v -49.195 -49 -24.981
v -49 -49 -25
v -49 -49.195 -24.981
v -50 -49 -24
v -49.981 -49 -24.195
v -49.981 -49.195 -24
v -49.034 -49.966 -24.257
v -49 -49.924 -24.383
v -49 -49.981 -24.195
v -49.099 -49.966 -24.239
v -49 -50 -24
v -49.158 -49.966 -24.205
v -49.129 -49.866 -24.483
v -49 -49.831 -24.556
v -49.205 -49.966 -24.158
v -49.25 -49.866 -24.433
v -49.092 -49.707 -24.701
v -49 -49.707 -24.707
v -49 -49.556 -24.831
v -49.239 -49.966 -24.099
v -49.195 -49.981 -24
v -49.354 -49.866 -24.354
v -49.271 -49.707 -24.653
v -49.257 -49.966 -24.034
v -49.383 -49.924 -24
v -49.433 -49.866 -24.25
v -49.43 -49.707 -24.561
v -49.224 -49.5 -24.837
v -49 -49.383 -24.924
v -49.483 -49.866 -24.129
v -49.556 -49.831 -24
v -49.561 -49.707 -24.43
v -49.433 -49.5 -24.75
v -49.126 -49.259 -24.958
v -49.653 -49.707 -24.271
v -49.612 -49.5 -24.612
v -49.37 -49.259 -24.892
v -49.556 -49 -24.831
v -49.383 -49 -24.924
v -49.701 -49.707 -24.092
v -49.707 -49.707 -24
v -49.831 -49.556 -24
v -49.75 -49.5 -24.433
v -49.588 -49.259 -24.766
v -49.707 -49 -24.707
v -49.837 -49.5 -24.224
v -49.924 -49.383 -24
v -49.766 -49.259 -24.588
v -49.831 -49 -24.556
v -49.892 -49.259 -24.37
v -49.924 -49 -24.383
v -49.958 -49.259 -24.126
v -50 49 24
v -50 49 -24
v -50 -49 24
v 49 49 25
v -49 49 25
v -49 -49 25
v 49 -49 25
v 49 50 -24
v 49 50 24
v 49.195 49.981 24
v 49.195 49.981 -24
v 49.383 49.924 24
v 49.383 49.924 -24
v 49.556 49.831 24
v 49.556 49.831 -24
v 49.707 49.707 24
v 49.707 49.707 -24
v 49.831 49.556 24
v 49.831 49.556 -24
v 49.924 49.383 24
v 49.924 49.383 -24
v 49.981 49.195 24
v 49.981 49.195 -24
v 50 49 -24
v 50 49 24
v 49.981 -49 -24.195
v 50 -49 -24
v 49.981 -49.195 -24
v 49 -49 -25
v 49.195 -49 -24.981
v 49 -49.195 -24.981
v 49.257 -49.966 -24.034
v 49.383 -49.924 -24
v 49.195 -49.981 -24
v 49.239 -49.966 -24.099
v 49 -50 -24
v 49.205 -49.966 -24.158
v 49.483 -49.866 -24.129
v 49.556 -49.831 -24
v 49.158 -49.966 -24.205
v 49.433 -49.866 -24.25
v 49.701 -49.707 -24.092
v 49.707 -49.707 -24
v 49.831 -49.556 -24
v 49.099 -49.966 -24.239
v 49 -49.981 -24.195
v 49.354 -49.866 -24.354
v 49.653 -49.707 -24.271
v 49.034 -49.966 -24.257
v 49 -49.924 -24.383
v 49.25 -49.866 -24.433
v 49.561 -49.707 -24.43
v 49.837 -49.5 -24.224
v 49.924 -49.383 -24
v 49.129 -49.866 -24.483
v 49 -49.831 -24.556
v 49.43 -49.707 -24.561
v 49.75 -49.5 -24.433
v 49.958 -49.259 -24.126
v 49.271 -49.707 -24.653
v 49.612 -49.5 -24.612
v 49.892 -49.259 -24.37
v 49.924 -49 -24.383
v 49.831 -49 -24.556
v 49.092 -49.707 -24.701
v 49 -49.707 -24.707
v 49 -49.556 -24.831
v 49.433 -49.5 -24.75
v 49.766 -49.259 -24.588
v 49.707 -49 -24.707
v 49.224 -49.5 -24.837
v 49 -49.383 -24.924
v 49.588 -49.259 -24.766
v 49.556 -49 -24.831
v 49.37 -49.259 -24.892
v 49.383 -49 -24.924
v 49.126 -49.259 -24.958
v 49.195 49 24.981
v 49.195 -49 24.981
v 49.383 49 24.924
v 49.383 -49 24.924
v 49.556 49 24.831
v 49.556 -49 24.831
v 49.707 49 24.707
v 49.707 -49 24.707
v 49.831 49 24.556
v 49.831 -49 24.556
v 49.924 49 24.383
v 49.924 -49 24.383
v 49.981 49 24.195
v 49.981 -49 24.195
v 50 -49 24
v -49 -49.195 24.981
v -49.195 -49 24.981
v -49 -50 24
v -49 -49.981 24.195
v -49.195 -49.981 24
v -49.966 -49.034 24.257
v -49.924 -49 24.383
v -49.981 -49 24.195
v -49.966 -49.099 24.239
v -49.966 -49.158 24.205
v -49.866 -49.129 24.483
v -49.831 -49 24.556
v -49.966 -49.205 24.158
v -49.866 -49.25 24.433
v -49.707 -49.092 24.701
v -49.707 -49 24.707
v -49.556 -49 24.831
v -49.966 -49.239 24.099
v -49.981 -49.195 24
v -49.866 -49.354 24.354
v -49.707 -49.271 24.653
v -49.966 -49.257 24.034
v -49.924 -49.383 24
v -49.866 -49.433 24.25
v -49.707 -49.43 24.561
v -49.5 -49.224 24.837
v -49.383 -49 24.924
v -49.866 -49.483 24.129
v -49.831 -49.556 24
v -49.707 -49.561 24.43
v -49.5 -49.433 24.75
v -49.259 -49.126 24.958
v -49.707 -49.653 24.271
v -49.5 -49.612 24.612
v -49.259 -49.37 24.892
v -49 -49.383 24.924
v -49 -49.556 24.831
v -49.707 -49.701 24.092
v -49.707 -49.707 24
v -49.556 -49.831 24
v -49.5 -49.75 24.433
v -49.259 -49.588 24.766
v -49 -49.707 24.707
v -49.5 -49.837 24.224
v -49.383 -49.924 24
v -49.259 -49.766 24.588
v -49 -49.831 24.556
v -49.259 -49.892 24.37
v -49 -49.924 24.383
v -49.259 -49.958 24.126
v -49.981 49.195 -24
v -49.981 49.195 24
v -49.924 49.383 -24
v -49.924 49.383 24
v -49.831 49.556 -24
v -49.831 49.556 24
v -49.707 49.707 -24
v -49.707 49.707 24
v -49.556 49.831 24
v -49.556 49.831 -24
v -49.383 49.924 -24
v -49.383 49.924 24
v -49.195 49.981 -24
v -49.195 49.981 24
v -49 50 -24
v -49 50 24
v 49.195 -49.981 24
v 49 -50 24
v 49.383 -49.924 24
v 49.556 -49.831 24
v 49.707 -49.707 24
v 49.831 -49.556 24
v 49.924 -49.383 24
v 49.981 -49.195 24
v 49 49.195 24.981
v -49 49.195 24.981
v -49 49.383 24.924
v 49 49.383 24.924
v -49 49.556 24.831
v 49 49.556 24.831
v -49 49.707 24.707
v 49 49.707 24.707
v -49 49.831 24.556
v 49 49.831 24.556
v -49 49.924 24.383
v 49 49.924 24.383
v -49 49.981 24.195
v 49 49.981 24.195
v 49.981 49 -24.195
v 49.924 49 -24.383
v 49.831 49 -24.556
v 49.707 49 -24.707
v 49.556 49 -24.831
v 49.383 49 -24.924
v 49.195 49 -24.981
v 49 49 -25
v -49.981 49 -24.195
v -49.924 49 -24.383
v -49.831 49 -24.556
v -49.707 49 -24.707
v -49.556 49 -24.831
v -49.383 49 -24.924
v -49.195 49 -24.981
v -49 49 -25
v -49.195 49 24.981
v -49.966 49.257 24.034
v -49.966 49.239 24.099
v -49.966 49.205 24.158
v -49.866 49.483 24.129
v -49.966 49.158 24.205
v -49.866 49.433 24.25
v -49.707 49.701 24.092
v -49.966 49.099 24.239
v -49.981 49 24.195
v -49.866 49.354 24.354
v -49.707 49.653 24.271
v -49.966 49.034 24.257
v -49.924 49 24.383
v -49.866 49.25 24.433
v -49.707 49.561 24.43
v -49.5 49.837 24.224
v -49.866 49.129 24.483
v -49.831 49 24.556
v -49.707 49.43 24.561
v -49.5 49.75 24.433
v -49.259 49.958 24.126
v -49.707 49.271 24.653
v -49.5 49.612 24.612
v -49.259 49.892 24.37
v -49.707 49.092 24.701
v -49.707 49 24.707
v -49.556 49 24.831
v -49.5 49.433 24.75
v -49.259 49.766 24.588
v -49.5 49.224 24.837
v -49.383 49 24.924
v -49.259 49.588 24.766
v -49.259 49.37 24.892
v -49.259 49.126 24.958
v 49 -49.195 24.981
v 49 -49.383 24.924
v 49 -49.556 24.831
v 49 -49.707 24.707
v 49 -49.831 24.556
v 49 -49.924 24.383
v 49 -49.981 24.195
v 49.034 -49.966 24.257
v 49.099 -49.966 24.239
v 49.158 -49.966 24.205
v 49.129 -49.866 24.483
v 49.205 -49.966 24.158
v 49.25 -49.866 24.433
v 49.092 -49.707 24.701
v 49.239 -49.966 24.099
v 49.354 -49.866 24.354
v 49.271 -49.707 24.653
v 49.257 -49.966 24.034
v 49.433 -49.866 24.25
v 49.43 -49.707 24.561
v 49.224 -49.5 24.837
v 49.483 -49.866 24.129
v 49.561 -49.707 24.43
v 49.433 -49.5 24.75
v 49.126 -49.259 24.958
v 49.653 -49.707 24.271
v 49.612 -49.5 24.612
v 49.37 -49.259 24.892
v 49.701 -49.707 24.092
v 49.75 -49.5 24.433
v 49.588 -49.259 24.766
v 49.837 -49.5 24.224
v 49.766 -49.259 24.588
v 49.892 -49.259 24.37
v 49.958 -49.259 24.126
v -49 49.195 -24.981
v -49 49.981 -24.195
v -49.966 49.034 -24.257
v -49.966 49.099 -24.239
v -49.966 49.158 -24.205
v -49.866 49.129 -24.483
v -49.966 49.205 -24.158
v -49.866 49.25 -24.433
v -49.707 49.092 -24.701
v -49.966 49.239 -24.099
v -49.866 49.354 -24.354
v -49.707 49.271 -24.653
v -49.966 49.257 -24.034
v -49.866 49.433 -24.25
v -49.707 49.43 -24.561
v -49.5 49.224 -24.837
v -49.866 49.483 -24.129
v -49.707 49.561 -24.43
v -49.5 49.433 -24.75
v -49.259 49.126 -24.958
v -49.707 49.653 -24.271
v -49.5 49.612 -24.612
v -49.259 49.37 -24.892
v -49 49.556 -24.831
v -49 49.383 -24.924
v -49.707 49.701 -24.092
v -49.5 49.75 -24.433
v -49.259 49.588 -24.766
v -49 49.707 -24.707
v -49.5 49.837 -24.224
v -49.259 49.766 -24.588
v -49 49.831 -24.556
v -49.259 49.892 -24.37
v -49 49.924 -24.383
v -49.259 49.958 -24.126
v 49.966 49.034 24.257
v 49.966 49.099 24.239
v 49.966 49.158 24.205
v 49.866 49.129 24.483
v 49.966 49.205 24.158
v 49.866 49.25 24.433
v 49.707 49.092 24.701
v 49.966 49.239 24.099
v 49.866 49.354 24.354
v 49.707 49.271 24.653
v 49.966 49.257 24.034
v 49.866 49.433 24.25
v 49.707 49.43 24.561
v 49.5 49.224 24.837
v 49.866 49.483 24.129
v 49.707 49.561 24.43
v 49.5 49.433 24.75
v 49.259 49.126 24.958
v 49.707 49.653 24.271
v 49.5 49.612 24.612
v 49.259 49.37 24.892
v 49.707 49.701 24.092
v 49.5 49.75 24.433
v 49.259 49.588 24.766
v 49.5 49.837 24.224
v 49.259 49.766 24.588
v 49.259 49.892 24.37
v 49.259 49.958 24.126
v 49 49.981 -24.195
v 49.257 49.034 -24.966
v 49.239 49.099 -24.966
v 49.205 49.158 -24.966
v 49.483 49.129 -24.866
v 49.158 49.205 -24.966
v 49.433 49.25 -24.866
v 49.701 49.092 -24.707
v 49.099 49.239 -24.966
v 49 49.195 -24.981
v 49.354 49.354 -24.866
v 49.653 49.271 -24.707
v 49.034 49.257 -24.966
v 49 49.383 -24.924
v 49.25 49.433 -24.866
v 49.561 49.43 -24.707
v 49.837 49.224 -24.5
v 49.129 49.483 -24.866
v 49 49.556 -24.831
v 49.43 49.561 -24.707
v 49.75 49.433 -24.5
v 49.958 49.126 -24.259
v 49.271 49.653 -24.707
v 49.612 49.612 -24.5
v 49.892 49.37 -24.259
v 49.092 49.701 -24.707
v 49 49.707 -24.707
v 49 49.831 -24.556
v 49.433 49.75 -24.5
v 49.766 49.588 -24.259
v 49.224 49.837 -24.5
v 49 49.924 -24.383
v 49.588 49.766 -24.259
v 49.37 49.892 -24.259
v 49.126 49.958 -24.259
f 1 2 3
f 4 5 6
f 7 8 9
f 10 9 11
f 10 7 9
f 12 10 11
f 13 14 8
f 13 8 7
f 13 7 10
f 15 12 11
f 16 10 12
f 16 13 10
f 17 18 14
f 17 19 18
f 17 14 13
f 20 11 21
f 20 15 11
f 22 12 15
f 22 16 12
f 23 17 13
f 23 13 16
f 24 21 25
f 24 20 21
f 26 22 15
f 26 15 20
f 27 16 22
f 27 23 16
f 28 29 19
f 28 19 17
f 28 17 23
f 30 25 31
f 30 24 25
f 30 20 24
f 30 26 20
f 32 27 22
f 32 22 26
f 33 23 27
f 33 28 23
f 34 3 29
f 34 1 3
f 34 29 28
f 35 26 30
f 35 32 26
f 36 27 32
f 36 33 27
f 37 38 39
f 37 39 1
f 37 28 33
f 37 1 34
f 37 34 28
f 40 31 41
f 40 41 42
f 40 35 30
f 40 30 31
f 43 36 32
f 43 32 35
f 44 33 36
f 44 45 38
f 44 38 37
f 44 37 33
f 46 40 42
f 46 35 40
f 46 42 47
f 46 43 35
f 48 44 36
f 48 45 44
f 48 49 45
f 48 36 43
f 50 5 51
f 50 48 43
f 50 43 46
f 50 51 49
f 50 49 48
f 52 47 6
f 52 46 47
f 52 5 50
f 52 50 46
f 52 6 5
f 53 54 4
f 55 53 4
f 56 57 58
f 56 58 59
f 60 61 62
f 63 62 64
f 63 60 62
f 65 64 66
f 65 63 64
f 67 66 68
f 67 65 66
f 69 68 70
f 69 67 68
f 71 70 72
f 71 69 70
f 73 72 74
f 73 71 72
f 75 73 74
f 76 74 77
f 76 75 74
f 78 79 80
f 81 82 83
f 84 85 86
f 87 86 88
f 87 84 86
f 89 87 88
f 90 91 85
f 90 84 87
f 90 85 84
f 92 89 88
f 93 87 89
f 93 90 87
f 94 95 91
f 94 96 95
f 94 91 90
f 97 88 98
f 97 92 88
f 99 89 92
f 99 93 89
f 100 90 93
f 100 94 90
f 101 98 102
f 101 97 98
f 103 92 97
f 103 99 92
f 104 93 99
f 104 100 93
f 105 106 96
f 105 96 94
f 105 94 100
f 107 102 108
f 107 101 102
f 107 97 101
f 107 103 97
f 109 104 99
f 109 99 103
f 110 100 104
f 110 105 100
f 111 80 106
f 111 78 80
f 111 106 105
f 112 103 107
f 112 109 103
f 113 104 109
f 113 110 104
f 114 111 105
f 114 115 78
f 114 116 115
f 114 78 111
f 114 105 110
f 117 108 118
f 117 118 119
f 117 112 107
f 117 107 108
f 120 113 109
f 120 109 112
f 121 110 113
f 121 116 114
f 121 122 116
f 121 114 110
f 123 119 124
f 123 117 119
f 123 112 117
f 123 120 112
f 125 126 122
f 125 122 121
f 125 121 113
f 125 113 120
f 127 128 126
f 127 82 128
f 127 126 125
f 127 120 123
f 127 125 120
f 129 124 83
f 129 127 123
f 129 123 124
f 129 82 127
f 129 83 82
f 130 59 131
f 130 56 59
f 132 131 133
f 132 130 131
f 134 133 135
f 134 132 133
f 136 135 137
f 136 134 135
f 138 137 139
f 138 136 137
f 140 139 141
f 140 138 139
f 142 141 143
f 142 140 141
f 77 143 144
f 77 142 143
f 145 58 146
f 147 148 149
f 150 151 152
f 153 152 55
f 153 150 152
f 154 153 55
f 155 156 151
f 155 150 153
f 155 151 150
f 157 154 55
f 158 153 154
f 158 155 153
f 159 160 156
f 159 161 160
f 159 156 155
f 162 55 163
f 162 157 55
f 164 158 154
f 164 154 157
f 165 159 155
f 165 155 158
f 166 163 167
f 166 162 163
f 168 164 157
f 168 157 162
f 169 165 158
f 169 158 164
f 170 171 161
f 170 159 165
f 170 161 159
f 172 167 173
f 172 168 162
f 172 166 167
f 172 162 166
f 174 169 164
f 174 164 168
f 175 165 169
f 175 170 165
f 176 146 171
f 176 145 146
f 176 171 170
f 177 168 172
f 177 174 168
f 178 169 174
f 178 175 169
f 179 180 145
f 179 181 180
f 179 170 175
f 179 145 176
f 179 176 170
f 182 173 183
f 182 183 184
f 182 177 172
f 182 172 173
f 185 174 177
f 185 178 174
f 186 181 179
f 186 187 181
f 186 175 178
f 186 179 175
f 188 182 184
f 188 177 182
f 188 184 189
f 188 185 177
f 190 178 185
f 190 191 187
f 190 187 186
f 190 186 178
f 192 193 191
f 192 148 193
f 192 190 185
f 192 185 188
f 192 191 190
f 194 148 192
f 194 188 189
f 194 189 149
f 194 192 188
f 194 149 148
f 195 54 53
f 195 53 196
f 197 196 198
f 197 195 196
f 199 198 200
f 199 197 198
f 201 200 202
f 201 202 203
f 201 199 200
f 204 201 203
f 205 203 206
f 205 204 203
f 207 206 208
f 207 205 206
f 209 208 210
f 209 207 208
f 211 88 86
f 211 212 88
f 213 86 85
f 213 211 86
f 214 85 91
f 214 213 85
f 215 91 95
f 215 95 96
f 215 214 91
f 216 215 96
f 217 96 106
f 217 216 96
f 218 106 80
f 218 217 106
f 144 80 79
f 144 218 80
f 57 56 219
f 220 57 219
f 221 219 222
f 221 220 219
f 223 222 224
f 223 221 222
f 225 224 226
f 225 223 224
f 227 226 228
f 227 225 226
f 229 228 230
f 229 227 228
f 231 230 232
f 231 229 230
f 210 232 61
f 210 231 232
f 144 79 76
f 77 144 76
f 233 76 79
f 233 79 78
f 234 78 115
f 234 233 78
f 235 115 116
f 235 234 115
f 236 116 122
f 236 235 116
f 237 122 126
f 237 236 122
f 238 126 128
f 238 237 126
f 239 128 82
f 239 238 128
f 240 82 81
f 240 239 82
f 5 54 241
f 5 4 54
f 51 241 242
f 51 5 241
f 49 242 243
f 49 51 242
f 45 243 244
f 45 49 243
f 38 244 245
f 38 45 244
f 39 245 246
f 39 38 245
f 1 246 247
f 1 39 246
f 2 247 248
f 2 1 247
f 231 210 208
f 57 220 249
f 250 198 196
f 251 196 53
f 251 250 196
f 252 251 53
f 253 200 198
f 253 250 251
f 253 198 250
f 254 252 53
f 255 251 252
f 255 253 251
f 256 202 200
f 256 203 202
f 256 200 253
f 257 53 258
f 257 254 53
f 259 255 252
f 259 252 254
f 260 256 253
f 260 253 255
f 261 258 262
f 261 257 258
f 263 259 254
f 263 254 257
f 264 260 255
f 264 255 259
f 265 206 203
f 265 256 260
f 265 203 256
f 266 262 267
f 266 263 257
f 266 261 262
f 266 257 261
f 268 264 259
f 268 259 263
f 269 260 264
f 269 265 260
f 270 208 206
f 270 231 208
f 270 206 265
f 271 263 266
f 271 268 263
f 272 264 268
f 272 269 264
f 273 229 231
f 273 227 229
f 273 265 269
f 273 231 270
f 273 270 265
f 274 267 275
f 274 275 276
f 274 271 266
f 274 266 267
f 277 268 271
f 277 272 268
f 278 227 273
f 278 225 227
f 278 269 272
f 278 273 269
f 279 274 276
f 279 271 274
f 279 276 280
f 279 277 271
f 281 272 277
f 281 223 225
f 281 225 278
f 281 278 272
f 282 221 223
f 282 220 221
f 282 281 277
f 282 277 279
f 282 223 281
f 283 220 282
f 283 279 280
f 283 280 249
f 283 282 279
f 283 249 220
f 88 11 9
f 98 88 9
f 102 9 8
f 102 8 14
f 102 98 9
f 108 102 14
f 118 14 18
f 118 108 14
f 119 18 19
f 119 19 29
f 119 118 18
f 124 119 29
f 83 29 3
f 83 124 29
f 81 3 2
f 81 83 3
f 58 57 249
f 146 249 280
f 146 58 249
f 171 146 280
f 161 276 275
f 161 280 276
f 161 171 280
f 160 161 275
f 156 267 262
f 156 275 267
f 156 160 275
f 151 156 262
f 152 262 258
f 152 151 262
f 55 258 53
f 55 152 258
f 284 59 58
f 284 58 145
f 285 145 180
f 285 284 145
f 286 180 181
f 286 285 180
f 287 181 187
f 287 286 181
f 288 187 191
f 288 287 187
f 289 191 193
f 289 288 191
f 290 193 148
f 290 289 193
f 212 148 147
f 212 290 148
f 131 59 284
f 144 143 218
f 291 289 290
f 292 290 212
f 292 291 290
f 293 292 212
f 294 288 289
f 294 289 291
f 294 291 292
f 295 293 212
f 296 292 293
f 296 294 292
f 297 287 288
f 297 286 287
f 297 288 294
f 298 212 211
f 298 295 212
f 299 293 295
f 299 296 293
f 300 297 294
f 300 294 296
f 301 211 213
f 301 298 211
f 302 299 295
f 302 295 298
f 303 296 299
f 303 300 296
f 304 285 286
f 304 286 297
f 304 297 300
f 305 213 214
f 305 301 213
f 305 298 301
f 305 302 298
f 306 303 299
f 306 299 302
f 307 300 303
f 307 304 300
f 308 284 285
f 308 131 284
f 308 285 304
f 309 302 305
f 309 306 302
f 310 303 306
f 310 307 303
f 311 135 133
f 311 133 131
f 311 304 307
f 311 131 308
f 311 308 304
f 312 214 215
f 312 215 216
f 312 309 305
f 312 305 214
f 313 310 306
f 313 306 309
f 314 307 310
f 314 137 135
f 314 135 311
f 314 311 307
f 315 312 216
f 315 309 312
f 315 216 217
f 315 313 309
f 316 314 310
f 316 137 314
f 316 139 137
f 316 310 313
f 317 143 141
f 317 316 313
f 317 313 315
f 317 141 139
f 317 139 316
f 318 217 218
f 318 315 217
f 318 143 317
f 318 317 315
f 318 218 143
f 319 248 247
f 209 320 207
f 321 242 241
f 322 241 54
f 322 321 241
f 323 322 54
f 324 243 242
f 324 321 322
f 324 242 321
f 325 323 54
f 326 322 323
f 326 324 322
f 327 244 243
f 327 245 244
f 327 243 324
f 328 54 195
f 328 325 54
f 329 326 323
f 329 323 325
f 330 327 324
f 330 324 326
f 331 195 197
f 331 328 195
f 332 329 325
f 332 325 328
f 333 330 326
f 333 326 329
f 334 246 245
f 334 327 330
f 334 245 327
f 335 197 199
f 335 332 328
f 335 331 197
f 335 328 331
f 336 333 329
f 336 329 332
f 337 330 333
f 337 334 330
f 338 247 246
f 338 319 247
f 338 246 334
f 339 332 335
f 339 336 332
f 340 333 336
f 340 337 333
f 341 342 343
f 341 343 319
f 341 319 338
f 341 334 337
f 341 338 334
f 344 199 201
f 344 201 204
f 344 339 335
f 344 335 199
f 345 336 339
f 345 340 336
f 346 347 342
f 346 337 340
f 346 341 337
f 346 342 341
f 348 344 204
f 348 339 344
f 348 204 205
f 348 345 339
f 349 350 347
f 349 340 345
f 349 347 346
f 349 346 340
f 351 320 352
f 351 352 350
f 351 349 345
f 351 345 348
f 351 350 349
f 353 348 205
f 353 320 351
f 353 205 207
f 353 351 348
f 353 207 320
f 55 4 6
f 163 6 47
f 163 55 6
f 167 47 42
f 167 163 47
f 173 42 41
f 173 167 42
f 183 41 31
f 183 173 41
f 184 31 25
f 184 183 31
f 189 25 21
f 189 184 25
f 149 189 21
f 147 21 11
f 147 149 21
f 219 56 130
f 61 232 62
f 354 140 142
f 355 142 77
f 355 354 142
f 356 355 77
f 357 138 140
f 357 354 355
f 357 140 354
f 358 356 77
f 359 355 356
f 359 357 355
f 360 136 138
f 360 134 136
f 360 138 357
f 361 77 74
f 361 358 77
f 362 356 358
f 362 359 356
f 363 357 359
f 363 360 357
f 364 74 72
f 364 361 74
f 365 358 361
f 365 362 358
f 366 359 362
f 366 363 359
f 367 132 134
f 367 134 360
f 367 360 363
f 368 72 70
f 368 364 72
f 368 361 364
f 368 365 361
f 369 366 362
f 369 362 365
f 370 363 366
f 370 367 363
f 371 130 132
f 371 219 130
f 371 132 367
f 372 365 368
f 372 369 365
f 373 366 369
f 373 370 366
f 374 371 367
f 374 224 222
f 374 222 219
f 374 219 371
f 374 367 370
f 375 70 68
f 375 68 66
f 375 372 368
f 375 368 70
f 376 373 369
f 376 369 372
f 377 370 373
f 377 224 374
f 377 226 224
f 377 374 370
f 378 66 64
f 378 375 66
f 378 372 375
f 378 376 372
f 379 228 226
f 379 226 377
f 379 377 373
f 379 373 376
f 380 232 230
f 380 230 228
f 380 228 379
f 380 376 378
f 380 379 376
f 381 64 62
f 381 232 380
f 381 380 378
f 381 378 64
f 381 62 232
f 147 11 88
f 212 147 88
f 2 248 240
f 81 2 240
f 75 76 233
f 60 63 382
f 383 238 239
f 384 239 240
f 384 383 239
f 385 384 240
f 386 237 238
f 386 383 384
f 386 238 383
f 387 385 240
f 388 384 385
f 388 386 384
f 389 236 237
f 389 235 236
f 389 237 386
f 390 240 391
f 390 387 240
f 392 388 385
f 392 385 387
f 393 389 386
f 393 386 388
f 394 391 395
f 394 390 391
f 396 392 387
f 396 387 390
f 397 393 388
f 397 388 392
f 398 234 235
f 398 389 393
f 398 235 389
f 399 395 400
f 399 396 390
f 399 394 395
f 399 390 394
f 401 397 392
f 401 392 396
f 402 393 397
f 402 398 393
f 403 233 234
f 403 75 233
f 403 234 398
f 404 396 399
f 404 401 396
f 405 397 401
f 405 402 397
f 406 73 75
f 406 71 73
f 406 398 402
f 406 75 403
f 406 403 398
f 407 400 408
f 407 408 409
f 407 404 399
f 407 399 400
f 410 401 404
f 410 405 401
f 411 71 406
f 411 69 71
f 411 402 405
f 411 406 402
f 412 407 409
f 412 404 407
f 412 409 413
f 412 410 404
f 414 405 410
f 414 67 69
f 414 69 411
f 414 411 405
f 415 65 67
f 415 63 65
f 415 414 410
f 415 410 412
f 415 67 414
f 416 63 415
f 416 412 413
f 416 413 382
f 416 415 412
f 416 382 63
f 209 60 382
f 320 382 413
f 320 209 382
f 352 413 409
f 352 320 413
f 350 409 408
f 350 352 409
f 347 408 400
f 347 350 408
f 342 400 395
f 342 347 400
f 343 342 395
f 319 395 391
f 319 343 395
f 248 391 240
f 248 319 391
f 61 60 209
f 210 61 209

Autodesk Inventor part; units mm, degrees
ref_plane "YZ Plane" through (0, 0, 0) normal (1, 0, 0) x (0, 1, 0)
ref_plane "XZ Plane" through (0, 0, 0) normal (0, 1, 0) x (-1, 0, 0)
ref_plane "XY Plane" through (0, 0, 0) normal (0, 0, 1) x (1, 0, 0)
sketch "Sketch1" plane through (0, 0, 0) normal (0, 0, 1) x (1, 0, 0)
  line L0 (-50, -50) -> (50, -50)
  line L1 (50, -50) -> (50, 50)
  line L2 (50, 50) -> (-50, 50)
  line L3 (-50, 50) -> (-50, -50)
  line L4 (-50, -50) -> (50, 50) construction
  line L5 (50, -50) -> (-50, 50) construction
  point P0 (0, 0)
  dimension "d0" = 100
  dimension "d1" = 100
extrude "Extrusion1" add sketch "Sketch1" along normal mid plane 50
fillet "Fillet2" radius 1 12 edges at (0, 50, 25) (50, 50, 0) (50, 0, 25) (50, 0, -25) (0, 50, -25) (50, -50, 0) (0, -50, 25) (-50, 50, 0) (-50, 0, -25) (-50, 0, 25) (-50, -50, 0) (0, -50, -25)
properties part number "magnet" material "Steel"
